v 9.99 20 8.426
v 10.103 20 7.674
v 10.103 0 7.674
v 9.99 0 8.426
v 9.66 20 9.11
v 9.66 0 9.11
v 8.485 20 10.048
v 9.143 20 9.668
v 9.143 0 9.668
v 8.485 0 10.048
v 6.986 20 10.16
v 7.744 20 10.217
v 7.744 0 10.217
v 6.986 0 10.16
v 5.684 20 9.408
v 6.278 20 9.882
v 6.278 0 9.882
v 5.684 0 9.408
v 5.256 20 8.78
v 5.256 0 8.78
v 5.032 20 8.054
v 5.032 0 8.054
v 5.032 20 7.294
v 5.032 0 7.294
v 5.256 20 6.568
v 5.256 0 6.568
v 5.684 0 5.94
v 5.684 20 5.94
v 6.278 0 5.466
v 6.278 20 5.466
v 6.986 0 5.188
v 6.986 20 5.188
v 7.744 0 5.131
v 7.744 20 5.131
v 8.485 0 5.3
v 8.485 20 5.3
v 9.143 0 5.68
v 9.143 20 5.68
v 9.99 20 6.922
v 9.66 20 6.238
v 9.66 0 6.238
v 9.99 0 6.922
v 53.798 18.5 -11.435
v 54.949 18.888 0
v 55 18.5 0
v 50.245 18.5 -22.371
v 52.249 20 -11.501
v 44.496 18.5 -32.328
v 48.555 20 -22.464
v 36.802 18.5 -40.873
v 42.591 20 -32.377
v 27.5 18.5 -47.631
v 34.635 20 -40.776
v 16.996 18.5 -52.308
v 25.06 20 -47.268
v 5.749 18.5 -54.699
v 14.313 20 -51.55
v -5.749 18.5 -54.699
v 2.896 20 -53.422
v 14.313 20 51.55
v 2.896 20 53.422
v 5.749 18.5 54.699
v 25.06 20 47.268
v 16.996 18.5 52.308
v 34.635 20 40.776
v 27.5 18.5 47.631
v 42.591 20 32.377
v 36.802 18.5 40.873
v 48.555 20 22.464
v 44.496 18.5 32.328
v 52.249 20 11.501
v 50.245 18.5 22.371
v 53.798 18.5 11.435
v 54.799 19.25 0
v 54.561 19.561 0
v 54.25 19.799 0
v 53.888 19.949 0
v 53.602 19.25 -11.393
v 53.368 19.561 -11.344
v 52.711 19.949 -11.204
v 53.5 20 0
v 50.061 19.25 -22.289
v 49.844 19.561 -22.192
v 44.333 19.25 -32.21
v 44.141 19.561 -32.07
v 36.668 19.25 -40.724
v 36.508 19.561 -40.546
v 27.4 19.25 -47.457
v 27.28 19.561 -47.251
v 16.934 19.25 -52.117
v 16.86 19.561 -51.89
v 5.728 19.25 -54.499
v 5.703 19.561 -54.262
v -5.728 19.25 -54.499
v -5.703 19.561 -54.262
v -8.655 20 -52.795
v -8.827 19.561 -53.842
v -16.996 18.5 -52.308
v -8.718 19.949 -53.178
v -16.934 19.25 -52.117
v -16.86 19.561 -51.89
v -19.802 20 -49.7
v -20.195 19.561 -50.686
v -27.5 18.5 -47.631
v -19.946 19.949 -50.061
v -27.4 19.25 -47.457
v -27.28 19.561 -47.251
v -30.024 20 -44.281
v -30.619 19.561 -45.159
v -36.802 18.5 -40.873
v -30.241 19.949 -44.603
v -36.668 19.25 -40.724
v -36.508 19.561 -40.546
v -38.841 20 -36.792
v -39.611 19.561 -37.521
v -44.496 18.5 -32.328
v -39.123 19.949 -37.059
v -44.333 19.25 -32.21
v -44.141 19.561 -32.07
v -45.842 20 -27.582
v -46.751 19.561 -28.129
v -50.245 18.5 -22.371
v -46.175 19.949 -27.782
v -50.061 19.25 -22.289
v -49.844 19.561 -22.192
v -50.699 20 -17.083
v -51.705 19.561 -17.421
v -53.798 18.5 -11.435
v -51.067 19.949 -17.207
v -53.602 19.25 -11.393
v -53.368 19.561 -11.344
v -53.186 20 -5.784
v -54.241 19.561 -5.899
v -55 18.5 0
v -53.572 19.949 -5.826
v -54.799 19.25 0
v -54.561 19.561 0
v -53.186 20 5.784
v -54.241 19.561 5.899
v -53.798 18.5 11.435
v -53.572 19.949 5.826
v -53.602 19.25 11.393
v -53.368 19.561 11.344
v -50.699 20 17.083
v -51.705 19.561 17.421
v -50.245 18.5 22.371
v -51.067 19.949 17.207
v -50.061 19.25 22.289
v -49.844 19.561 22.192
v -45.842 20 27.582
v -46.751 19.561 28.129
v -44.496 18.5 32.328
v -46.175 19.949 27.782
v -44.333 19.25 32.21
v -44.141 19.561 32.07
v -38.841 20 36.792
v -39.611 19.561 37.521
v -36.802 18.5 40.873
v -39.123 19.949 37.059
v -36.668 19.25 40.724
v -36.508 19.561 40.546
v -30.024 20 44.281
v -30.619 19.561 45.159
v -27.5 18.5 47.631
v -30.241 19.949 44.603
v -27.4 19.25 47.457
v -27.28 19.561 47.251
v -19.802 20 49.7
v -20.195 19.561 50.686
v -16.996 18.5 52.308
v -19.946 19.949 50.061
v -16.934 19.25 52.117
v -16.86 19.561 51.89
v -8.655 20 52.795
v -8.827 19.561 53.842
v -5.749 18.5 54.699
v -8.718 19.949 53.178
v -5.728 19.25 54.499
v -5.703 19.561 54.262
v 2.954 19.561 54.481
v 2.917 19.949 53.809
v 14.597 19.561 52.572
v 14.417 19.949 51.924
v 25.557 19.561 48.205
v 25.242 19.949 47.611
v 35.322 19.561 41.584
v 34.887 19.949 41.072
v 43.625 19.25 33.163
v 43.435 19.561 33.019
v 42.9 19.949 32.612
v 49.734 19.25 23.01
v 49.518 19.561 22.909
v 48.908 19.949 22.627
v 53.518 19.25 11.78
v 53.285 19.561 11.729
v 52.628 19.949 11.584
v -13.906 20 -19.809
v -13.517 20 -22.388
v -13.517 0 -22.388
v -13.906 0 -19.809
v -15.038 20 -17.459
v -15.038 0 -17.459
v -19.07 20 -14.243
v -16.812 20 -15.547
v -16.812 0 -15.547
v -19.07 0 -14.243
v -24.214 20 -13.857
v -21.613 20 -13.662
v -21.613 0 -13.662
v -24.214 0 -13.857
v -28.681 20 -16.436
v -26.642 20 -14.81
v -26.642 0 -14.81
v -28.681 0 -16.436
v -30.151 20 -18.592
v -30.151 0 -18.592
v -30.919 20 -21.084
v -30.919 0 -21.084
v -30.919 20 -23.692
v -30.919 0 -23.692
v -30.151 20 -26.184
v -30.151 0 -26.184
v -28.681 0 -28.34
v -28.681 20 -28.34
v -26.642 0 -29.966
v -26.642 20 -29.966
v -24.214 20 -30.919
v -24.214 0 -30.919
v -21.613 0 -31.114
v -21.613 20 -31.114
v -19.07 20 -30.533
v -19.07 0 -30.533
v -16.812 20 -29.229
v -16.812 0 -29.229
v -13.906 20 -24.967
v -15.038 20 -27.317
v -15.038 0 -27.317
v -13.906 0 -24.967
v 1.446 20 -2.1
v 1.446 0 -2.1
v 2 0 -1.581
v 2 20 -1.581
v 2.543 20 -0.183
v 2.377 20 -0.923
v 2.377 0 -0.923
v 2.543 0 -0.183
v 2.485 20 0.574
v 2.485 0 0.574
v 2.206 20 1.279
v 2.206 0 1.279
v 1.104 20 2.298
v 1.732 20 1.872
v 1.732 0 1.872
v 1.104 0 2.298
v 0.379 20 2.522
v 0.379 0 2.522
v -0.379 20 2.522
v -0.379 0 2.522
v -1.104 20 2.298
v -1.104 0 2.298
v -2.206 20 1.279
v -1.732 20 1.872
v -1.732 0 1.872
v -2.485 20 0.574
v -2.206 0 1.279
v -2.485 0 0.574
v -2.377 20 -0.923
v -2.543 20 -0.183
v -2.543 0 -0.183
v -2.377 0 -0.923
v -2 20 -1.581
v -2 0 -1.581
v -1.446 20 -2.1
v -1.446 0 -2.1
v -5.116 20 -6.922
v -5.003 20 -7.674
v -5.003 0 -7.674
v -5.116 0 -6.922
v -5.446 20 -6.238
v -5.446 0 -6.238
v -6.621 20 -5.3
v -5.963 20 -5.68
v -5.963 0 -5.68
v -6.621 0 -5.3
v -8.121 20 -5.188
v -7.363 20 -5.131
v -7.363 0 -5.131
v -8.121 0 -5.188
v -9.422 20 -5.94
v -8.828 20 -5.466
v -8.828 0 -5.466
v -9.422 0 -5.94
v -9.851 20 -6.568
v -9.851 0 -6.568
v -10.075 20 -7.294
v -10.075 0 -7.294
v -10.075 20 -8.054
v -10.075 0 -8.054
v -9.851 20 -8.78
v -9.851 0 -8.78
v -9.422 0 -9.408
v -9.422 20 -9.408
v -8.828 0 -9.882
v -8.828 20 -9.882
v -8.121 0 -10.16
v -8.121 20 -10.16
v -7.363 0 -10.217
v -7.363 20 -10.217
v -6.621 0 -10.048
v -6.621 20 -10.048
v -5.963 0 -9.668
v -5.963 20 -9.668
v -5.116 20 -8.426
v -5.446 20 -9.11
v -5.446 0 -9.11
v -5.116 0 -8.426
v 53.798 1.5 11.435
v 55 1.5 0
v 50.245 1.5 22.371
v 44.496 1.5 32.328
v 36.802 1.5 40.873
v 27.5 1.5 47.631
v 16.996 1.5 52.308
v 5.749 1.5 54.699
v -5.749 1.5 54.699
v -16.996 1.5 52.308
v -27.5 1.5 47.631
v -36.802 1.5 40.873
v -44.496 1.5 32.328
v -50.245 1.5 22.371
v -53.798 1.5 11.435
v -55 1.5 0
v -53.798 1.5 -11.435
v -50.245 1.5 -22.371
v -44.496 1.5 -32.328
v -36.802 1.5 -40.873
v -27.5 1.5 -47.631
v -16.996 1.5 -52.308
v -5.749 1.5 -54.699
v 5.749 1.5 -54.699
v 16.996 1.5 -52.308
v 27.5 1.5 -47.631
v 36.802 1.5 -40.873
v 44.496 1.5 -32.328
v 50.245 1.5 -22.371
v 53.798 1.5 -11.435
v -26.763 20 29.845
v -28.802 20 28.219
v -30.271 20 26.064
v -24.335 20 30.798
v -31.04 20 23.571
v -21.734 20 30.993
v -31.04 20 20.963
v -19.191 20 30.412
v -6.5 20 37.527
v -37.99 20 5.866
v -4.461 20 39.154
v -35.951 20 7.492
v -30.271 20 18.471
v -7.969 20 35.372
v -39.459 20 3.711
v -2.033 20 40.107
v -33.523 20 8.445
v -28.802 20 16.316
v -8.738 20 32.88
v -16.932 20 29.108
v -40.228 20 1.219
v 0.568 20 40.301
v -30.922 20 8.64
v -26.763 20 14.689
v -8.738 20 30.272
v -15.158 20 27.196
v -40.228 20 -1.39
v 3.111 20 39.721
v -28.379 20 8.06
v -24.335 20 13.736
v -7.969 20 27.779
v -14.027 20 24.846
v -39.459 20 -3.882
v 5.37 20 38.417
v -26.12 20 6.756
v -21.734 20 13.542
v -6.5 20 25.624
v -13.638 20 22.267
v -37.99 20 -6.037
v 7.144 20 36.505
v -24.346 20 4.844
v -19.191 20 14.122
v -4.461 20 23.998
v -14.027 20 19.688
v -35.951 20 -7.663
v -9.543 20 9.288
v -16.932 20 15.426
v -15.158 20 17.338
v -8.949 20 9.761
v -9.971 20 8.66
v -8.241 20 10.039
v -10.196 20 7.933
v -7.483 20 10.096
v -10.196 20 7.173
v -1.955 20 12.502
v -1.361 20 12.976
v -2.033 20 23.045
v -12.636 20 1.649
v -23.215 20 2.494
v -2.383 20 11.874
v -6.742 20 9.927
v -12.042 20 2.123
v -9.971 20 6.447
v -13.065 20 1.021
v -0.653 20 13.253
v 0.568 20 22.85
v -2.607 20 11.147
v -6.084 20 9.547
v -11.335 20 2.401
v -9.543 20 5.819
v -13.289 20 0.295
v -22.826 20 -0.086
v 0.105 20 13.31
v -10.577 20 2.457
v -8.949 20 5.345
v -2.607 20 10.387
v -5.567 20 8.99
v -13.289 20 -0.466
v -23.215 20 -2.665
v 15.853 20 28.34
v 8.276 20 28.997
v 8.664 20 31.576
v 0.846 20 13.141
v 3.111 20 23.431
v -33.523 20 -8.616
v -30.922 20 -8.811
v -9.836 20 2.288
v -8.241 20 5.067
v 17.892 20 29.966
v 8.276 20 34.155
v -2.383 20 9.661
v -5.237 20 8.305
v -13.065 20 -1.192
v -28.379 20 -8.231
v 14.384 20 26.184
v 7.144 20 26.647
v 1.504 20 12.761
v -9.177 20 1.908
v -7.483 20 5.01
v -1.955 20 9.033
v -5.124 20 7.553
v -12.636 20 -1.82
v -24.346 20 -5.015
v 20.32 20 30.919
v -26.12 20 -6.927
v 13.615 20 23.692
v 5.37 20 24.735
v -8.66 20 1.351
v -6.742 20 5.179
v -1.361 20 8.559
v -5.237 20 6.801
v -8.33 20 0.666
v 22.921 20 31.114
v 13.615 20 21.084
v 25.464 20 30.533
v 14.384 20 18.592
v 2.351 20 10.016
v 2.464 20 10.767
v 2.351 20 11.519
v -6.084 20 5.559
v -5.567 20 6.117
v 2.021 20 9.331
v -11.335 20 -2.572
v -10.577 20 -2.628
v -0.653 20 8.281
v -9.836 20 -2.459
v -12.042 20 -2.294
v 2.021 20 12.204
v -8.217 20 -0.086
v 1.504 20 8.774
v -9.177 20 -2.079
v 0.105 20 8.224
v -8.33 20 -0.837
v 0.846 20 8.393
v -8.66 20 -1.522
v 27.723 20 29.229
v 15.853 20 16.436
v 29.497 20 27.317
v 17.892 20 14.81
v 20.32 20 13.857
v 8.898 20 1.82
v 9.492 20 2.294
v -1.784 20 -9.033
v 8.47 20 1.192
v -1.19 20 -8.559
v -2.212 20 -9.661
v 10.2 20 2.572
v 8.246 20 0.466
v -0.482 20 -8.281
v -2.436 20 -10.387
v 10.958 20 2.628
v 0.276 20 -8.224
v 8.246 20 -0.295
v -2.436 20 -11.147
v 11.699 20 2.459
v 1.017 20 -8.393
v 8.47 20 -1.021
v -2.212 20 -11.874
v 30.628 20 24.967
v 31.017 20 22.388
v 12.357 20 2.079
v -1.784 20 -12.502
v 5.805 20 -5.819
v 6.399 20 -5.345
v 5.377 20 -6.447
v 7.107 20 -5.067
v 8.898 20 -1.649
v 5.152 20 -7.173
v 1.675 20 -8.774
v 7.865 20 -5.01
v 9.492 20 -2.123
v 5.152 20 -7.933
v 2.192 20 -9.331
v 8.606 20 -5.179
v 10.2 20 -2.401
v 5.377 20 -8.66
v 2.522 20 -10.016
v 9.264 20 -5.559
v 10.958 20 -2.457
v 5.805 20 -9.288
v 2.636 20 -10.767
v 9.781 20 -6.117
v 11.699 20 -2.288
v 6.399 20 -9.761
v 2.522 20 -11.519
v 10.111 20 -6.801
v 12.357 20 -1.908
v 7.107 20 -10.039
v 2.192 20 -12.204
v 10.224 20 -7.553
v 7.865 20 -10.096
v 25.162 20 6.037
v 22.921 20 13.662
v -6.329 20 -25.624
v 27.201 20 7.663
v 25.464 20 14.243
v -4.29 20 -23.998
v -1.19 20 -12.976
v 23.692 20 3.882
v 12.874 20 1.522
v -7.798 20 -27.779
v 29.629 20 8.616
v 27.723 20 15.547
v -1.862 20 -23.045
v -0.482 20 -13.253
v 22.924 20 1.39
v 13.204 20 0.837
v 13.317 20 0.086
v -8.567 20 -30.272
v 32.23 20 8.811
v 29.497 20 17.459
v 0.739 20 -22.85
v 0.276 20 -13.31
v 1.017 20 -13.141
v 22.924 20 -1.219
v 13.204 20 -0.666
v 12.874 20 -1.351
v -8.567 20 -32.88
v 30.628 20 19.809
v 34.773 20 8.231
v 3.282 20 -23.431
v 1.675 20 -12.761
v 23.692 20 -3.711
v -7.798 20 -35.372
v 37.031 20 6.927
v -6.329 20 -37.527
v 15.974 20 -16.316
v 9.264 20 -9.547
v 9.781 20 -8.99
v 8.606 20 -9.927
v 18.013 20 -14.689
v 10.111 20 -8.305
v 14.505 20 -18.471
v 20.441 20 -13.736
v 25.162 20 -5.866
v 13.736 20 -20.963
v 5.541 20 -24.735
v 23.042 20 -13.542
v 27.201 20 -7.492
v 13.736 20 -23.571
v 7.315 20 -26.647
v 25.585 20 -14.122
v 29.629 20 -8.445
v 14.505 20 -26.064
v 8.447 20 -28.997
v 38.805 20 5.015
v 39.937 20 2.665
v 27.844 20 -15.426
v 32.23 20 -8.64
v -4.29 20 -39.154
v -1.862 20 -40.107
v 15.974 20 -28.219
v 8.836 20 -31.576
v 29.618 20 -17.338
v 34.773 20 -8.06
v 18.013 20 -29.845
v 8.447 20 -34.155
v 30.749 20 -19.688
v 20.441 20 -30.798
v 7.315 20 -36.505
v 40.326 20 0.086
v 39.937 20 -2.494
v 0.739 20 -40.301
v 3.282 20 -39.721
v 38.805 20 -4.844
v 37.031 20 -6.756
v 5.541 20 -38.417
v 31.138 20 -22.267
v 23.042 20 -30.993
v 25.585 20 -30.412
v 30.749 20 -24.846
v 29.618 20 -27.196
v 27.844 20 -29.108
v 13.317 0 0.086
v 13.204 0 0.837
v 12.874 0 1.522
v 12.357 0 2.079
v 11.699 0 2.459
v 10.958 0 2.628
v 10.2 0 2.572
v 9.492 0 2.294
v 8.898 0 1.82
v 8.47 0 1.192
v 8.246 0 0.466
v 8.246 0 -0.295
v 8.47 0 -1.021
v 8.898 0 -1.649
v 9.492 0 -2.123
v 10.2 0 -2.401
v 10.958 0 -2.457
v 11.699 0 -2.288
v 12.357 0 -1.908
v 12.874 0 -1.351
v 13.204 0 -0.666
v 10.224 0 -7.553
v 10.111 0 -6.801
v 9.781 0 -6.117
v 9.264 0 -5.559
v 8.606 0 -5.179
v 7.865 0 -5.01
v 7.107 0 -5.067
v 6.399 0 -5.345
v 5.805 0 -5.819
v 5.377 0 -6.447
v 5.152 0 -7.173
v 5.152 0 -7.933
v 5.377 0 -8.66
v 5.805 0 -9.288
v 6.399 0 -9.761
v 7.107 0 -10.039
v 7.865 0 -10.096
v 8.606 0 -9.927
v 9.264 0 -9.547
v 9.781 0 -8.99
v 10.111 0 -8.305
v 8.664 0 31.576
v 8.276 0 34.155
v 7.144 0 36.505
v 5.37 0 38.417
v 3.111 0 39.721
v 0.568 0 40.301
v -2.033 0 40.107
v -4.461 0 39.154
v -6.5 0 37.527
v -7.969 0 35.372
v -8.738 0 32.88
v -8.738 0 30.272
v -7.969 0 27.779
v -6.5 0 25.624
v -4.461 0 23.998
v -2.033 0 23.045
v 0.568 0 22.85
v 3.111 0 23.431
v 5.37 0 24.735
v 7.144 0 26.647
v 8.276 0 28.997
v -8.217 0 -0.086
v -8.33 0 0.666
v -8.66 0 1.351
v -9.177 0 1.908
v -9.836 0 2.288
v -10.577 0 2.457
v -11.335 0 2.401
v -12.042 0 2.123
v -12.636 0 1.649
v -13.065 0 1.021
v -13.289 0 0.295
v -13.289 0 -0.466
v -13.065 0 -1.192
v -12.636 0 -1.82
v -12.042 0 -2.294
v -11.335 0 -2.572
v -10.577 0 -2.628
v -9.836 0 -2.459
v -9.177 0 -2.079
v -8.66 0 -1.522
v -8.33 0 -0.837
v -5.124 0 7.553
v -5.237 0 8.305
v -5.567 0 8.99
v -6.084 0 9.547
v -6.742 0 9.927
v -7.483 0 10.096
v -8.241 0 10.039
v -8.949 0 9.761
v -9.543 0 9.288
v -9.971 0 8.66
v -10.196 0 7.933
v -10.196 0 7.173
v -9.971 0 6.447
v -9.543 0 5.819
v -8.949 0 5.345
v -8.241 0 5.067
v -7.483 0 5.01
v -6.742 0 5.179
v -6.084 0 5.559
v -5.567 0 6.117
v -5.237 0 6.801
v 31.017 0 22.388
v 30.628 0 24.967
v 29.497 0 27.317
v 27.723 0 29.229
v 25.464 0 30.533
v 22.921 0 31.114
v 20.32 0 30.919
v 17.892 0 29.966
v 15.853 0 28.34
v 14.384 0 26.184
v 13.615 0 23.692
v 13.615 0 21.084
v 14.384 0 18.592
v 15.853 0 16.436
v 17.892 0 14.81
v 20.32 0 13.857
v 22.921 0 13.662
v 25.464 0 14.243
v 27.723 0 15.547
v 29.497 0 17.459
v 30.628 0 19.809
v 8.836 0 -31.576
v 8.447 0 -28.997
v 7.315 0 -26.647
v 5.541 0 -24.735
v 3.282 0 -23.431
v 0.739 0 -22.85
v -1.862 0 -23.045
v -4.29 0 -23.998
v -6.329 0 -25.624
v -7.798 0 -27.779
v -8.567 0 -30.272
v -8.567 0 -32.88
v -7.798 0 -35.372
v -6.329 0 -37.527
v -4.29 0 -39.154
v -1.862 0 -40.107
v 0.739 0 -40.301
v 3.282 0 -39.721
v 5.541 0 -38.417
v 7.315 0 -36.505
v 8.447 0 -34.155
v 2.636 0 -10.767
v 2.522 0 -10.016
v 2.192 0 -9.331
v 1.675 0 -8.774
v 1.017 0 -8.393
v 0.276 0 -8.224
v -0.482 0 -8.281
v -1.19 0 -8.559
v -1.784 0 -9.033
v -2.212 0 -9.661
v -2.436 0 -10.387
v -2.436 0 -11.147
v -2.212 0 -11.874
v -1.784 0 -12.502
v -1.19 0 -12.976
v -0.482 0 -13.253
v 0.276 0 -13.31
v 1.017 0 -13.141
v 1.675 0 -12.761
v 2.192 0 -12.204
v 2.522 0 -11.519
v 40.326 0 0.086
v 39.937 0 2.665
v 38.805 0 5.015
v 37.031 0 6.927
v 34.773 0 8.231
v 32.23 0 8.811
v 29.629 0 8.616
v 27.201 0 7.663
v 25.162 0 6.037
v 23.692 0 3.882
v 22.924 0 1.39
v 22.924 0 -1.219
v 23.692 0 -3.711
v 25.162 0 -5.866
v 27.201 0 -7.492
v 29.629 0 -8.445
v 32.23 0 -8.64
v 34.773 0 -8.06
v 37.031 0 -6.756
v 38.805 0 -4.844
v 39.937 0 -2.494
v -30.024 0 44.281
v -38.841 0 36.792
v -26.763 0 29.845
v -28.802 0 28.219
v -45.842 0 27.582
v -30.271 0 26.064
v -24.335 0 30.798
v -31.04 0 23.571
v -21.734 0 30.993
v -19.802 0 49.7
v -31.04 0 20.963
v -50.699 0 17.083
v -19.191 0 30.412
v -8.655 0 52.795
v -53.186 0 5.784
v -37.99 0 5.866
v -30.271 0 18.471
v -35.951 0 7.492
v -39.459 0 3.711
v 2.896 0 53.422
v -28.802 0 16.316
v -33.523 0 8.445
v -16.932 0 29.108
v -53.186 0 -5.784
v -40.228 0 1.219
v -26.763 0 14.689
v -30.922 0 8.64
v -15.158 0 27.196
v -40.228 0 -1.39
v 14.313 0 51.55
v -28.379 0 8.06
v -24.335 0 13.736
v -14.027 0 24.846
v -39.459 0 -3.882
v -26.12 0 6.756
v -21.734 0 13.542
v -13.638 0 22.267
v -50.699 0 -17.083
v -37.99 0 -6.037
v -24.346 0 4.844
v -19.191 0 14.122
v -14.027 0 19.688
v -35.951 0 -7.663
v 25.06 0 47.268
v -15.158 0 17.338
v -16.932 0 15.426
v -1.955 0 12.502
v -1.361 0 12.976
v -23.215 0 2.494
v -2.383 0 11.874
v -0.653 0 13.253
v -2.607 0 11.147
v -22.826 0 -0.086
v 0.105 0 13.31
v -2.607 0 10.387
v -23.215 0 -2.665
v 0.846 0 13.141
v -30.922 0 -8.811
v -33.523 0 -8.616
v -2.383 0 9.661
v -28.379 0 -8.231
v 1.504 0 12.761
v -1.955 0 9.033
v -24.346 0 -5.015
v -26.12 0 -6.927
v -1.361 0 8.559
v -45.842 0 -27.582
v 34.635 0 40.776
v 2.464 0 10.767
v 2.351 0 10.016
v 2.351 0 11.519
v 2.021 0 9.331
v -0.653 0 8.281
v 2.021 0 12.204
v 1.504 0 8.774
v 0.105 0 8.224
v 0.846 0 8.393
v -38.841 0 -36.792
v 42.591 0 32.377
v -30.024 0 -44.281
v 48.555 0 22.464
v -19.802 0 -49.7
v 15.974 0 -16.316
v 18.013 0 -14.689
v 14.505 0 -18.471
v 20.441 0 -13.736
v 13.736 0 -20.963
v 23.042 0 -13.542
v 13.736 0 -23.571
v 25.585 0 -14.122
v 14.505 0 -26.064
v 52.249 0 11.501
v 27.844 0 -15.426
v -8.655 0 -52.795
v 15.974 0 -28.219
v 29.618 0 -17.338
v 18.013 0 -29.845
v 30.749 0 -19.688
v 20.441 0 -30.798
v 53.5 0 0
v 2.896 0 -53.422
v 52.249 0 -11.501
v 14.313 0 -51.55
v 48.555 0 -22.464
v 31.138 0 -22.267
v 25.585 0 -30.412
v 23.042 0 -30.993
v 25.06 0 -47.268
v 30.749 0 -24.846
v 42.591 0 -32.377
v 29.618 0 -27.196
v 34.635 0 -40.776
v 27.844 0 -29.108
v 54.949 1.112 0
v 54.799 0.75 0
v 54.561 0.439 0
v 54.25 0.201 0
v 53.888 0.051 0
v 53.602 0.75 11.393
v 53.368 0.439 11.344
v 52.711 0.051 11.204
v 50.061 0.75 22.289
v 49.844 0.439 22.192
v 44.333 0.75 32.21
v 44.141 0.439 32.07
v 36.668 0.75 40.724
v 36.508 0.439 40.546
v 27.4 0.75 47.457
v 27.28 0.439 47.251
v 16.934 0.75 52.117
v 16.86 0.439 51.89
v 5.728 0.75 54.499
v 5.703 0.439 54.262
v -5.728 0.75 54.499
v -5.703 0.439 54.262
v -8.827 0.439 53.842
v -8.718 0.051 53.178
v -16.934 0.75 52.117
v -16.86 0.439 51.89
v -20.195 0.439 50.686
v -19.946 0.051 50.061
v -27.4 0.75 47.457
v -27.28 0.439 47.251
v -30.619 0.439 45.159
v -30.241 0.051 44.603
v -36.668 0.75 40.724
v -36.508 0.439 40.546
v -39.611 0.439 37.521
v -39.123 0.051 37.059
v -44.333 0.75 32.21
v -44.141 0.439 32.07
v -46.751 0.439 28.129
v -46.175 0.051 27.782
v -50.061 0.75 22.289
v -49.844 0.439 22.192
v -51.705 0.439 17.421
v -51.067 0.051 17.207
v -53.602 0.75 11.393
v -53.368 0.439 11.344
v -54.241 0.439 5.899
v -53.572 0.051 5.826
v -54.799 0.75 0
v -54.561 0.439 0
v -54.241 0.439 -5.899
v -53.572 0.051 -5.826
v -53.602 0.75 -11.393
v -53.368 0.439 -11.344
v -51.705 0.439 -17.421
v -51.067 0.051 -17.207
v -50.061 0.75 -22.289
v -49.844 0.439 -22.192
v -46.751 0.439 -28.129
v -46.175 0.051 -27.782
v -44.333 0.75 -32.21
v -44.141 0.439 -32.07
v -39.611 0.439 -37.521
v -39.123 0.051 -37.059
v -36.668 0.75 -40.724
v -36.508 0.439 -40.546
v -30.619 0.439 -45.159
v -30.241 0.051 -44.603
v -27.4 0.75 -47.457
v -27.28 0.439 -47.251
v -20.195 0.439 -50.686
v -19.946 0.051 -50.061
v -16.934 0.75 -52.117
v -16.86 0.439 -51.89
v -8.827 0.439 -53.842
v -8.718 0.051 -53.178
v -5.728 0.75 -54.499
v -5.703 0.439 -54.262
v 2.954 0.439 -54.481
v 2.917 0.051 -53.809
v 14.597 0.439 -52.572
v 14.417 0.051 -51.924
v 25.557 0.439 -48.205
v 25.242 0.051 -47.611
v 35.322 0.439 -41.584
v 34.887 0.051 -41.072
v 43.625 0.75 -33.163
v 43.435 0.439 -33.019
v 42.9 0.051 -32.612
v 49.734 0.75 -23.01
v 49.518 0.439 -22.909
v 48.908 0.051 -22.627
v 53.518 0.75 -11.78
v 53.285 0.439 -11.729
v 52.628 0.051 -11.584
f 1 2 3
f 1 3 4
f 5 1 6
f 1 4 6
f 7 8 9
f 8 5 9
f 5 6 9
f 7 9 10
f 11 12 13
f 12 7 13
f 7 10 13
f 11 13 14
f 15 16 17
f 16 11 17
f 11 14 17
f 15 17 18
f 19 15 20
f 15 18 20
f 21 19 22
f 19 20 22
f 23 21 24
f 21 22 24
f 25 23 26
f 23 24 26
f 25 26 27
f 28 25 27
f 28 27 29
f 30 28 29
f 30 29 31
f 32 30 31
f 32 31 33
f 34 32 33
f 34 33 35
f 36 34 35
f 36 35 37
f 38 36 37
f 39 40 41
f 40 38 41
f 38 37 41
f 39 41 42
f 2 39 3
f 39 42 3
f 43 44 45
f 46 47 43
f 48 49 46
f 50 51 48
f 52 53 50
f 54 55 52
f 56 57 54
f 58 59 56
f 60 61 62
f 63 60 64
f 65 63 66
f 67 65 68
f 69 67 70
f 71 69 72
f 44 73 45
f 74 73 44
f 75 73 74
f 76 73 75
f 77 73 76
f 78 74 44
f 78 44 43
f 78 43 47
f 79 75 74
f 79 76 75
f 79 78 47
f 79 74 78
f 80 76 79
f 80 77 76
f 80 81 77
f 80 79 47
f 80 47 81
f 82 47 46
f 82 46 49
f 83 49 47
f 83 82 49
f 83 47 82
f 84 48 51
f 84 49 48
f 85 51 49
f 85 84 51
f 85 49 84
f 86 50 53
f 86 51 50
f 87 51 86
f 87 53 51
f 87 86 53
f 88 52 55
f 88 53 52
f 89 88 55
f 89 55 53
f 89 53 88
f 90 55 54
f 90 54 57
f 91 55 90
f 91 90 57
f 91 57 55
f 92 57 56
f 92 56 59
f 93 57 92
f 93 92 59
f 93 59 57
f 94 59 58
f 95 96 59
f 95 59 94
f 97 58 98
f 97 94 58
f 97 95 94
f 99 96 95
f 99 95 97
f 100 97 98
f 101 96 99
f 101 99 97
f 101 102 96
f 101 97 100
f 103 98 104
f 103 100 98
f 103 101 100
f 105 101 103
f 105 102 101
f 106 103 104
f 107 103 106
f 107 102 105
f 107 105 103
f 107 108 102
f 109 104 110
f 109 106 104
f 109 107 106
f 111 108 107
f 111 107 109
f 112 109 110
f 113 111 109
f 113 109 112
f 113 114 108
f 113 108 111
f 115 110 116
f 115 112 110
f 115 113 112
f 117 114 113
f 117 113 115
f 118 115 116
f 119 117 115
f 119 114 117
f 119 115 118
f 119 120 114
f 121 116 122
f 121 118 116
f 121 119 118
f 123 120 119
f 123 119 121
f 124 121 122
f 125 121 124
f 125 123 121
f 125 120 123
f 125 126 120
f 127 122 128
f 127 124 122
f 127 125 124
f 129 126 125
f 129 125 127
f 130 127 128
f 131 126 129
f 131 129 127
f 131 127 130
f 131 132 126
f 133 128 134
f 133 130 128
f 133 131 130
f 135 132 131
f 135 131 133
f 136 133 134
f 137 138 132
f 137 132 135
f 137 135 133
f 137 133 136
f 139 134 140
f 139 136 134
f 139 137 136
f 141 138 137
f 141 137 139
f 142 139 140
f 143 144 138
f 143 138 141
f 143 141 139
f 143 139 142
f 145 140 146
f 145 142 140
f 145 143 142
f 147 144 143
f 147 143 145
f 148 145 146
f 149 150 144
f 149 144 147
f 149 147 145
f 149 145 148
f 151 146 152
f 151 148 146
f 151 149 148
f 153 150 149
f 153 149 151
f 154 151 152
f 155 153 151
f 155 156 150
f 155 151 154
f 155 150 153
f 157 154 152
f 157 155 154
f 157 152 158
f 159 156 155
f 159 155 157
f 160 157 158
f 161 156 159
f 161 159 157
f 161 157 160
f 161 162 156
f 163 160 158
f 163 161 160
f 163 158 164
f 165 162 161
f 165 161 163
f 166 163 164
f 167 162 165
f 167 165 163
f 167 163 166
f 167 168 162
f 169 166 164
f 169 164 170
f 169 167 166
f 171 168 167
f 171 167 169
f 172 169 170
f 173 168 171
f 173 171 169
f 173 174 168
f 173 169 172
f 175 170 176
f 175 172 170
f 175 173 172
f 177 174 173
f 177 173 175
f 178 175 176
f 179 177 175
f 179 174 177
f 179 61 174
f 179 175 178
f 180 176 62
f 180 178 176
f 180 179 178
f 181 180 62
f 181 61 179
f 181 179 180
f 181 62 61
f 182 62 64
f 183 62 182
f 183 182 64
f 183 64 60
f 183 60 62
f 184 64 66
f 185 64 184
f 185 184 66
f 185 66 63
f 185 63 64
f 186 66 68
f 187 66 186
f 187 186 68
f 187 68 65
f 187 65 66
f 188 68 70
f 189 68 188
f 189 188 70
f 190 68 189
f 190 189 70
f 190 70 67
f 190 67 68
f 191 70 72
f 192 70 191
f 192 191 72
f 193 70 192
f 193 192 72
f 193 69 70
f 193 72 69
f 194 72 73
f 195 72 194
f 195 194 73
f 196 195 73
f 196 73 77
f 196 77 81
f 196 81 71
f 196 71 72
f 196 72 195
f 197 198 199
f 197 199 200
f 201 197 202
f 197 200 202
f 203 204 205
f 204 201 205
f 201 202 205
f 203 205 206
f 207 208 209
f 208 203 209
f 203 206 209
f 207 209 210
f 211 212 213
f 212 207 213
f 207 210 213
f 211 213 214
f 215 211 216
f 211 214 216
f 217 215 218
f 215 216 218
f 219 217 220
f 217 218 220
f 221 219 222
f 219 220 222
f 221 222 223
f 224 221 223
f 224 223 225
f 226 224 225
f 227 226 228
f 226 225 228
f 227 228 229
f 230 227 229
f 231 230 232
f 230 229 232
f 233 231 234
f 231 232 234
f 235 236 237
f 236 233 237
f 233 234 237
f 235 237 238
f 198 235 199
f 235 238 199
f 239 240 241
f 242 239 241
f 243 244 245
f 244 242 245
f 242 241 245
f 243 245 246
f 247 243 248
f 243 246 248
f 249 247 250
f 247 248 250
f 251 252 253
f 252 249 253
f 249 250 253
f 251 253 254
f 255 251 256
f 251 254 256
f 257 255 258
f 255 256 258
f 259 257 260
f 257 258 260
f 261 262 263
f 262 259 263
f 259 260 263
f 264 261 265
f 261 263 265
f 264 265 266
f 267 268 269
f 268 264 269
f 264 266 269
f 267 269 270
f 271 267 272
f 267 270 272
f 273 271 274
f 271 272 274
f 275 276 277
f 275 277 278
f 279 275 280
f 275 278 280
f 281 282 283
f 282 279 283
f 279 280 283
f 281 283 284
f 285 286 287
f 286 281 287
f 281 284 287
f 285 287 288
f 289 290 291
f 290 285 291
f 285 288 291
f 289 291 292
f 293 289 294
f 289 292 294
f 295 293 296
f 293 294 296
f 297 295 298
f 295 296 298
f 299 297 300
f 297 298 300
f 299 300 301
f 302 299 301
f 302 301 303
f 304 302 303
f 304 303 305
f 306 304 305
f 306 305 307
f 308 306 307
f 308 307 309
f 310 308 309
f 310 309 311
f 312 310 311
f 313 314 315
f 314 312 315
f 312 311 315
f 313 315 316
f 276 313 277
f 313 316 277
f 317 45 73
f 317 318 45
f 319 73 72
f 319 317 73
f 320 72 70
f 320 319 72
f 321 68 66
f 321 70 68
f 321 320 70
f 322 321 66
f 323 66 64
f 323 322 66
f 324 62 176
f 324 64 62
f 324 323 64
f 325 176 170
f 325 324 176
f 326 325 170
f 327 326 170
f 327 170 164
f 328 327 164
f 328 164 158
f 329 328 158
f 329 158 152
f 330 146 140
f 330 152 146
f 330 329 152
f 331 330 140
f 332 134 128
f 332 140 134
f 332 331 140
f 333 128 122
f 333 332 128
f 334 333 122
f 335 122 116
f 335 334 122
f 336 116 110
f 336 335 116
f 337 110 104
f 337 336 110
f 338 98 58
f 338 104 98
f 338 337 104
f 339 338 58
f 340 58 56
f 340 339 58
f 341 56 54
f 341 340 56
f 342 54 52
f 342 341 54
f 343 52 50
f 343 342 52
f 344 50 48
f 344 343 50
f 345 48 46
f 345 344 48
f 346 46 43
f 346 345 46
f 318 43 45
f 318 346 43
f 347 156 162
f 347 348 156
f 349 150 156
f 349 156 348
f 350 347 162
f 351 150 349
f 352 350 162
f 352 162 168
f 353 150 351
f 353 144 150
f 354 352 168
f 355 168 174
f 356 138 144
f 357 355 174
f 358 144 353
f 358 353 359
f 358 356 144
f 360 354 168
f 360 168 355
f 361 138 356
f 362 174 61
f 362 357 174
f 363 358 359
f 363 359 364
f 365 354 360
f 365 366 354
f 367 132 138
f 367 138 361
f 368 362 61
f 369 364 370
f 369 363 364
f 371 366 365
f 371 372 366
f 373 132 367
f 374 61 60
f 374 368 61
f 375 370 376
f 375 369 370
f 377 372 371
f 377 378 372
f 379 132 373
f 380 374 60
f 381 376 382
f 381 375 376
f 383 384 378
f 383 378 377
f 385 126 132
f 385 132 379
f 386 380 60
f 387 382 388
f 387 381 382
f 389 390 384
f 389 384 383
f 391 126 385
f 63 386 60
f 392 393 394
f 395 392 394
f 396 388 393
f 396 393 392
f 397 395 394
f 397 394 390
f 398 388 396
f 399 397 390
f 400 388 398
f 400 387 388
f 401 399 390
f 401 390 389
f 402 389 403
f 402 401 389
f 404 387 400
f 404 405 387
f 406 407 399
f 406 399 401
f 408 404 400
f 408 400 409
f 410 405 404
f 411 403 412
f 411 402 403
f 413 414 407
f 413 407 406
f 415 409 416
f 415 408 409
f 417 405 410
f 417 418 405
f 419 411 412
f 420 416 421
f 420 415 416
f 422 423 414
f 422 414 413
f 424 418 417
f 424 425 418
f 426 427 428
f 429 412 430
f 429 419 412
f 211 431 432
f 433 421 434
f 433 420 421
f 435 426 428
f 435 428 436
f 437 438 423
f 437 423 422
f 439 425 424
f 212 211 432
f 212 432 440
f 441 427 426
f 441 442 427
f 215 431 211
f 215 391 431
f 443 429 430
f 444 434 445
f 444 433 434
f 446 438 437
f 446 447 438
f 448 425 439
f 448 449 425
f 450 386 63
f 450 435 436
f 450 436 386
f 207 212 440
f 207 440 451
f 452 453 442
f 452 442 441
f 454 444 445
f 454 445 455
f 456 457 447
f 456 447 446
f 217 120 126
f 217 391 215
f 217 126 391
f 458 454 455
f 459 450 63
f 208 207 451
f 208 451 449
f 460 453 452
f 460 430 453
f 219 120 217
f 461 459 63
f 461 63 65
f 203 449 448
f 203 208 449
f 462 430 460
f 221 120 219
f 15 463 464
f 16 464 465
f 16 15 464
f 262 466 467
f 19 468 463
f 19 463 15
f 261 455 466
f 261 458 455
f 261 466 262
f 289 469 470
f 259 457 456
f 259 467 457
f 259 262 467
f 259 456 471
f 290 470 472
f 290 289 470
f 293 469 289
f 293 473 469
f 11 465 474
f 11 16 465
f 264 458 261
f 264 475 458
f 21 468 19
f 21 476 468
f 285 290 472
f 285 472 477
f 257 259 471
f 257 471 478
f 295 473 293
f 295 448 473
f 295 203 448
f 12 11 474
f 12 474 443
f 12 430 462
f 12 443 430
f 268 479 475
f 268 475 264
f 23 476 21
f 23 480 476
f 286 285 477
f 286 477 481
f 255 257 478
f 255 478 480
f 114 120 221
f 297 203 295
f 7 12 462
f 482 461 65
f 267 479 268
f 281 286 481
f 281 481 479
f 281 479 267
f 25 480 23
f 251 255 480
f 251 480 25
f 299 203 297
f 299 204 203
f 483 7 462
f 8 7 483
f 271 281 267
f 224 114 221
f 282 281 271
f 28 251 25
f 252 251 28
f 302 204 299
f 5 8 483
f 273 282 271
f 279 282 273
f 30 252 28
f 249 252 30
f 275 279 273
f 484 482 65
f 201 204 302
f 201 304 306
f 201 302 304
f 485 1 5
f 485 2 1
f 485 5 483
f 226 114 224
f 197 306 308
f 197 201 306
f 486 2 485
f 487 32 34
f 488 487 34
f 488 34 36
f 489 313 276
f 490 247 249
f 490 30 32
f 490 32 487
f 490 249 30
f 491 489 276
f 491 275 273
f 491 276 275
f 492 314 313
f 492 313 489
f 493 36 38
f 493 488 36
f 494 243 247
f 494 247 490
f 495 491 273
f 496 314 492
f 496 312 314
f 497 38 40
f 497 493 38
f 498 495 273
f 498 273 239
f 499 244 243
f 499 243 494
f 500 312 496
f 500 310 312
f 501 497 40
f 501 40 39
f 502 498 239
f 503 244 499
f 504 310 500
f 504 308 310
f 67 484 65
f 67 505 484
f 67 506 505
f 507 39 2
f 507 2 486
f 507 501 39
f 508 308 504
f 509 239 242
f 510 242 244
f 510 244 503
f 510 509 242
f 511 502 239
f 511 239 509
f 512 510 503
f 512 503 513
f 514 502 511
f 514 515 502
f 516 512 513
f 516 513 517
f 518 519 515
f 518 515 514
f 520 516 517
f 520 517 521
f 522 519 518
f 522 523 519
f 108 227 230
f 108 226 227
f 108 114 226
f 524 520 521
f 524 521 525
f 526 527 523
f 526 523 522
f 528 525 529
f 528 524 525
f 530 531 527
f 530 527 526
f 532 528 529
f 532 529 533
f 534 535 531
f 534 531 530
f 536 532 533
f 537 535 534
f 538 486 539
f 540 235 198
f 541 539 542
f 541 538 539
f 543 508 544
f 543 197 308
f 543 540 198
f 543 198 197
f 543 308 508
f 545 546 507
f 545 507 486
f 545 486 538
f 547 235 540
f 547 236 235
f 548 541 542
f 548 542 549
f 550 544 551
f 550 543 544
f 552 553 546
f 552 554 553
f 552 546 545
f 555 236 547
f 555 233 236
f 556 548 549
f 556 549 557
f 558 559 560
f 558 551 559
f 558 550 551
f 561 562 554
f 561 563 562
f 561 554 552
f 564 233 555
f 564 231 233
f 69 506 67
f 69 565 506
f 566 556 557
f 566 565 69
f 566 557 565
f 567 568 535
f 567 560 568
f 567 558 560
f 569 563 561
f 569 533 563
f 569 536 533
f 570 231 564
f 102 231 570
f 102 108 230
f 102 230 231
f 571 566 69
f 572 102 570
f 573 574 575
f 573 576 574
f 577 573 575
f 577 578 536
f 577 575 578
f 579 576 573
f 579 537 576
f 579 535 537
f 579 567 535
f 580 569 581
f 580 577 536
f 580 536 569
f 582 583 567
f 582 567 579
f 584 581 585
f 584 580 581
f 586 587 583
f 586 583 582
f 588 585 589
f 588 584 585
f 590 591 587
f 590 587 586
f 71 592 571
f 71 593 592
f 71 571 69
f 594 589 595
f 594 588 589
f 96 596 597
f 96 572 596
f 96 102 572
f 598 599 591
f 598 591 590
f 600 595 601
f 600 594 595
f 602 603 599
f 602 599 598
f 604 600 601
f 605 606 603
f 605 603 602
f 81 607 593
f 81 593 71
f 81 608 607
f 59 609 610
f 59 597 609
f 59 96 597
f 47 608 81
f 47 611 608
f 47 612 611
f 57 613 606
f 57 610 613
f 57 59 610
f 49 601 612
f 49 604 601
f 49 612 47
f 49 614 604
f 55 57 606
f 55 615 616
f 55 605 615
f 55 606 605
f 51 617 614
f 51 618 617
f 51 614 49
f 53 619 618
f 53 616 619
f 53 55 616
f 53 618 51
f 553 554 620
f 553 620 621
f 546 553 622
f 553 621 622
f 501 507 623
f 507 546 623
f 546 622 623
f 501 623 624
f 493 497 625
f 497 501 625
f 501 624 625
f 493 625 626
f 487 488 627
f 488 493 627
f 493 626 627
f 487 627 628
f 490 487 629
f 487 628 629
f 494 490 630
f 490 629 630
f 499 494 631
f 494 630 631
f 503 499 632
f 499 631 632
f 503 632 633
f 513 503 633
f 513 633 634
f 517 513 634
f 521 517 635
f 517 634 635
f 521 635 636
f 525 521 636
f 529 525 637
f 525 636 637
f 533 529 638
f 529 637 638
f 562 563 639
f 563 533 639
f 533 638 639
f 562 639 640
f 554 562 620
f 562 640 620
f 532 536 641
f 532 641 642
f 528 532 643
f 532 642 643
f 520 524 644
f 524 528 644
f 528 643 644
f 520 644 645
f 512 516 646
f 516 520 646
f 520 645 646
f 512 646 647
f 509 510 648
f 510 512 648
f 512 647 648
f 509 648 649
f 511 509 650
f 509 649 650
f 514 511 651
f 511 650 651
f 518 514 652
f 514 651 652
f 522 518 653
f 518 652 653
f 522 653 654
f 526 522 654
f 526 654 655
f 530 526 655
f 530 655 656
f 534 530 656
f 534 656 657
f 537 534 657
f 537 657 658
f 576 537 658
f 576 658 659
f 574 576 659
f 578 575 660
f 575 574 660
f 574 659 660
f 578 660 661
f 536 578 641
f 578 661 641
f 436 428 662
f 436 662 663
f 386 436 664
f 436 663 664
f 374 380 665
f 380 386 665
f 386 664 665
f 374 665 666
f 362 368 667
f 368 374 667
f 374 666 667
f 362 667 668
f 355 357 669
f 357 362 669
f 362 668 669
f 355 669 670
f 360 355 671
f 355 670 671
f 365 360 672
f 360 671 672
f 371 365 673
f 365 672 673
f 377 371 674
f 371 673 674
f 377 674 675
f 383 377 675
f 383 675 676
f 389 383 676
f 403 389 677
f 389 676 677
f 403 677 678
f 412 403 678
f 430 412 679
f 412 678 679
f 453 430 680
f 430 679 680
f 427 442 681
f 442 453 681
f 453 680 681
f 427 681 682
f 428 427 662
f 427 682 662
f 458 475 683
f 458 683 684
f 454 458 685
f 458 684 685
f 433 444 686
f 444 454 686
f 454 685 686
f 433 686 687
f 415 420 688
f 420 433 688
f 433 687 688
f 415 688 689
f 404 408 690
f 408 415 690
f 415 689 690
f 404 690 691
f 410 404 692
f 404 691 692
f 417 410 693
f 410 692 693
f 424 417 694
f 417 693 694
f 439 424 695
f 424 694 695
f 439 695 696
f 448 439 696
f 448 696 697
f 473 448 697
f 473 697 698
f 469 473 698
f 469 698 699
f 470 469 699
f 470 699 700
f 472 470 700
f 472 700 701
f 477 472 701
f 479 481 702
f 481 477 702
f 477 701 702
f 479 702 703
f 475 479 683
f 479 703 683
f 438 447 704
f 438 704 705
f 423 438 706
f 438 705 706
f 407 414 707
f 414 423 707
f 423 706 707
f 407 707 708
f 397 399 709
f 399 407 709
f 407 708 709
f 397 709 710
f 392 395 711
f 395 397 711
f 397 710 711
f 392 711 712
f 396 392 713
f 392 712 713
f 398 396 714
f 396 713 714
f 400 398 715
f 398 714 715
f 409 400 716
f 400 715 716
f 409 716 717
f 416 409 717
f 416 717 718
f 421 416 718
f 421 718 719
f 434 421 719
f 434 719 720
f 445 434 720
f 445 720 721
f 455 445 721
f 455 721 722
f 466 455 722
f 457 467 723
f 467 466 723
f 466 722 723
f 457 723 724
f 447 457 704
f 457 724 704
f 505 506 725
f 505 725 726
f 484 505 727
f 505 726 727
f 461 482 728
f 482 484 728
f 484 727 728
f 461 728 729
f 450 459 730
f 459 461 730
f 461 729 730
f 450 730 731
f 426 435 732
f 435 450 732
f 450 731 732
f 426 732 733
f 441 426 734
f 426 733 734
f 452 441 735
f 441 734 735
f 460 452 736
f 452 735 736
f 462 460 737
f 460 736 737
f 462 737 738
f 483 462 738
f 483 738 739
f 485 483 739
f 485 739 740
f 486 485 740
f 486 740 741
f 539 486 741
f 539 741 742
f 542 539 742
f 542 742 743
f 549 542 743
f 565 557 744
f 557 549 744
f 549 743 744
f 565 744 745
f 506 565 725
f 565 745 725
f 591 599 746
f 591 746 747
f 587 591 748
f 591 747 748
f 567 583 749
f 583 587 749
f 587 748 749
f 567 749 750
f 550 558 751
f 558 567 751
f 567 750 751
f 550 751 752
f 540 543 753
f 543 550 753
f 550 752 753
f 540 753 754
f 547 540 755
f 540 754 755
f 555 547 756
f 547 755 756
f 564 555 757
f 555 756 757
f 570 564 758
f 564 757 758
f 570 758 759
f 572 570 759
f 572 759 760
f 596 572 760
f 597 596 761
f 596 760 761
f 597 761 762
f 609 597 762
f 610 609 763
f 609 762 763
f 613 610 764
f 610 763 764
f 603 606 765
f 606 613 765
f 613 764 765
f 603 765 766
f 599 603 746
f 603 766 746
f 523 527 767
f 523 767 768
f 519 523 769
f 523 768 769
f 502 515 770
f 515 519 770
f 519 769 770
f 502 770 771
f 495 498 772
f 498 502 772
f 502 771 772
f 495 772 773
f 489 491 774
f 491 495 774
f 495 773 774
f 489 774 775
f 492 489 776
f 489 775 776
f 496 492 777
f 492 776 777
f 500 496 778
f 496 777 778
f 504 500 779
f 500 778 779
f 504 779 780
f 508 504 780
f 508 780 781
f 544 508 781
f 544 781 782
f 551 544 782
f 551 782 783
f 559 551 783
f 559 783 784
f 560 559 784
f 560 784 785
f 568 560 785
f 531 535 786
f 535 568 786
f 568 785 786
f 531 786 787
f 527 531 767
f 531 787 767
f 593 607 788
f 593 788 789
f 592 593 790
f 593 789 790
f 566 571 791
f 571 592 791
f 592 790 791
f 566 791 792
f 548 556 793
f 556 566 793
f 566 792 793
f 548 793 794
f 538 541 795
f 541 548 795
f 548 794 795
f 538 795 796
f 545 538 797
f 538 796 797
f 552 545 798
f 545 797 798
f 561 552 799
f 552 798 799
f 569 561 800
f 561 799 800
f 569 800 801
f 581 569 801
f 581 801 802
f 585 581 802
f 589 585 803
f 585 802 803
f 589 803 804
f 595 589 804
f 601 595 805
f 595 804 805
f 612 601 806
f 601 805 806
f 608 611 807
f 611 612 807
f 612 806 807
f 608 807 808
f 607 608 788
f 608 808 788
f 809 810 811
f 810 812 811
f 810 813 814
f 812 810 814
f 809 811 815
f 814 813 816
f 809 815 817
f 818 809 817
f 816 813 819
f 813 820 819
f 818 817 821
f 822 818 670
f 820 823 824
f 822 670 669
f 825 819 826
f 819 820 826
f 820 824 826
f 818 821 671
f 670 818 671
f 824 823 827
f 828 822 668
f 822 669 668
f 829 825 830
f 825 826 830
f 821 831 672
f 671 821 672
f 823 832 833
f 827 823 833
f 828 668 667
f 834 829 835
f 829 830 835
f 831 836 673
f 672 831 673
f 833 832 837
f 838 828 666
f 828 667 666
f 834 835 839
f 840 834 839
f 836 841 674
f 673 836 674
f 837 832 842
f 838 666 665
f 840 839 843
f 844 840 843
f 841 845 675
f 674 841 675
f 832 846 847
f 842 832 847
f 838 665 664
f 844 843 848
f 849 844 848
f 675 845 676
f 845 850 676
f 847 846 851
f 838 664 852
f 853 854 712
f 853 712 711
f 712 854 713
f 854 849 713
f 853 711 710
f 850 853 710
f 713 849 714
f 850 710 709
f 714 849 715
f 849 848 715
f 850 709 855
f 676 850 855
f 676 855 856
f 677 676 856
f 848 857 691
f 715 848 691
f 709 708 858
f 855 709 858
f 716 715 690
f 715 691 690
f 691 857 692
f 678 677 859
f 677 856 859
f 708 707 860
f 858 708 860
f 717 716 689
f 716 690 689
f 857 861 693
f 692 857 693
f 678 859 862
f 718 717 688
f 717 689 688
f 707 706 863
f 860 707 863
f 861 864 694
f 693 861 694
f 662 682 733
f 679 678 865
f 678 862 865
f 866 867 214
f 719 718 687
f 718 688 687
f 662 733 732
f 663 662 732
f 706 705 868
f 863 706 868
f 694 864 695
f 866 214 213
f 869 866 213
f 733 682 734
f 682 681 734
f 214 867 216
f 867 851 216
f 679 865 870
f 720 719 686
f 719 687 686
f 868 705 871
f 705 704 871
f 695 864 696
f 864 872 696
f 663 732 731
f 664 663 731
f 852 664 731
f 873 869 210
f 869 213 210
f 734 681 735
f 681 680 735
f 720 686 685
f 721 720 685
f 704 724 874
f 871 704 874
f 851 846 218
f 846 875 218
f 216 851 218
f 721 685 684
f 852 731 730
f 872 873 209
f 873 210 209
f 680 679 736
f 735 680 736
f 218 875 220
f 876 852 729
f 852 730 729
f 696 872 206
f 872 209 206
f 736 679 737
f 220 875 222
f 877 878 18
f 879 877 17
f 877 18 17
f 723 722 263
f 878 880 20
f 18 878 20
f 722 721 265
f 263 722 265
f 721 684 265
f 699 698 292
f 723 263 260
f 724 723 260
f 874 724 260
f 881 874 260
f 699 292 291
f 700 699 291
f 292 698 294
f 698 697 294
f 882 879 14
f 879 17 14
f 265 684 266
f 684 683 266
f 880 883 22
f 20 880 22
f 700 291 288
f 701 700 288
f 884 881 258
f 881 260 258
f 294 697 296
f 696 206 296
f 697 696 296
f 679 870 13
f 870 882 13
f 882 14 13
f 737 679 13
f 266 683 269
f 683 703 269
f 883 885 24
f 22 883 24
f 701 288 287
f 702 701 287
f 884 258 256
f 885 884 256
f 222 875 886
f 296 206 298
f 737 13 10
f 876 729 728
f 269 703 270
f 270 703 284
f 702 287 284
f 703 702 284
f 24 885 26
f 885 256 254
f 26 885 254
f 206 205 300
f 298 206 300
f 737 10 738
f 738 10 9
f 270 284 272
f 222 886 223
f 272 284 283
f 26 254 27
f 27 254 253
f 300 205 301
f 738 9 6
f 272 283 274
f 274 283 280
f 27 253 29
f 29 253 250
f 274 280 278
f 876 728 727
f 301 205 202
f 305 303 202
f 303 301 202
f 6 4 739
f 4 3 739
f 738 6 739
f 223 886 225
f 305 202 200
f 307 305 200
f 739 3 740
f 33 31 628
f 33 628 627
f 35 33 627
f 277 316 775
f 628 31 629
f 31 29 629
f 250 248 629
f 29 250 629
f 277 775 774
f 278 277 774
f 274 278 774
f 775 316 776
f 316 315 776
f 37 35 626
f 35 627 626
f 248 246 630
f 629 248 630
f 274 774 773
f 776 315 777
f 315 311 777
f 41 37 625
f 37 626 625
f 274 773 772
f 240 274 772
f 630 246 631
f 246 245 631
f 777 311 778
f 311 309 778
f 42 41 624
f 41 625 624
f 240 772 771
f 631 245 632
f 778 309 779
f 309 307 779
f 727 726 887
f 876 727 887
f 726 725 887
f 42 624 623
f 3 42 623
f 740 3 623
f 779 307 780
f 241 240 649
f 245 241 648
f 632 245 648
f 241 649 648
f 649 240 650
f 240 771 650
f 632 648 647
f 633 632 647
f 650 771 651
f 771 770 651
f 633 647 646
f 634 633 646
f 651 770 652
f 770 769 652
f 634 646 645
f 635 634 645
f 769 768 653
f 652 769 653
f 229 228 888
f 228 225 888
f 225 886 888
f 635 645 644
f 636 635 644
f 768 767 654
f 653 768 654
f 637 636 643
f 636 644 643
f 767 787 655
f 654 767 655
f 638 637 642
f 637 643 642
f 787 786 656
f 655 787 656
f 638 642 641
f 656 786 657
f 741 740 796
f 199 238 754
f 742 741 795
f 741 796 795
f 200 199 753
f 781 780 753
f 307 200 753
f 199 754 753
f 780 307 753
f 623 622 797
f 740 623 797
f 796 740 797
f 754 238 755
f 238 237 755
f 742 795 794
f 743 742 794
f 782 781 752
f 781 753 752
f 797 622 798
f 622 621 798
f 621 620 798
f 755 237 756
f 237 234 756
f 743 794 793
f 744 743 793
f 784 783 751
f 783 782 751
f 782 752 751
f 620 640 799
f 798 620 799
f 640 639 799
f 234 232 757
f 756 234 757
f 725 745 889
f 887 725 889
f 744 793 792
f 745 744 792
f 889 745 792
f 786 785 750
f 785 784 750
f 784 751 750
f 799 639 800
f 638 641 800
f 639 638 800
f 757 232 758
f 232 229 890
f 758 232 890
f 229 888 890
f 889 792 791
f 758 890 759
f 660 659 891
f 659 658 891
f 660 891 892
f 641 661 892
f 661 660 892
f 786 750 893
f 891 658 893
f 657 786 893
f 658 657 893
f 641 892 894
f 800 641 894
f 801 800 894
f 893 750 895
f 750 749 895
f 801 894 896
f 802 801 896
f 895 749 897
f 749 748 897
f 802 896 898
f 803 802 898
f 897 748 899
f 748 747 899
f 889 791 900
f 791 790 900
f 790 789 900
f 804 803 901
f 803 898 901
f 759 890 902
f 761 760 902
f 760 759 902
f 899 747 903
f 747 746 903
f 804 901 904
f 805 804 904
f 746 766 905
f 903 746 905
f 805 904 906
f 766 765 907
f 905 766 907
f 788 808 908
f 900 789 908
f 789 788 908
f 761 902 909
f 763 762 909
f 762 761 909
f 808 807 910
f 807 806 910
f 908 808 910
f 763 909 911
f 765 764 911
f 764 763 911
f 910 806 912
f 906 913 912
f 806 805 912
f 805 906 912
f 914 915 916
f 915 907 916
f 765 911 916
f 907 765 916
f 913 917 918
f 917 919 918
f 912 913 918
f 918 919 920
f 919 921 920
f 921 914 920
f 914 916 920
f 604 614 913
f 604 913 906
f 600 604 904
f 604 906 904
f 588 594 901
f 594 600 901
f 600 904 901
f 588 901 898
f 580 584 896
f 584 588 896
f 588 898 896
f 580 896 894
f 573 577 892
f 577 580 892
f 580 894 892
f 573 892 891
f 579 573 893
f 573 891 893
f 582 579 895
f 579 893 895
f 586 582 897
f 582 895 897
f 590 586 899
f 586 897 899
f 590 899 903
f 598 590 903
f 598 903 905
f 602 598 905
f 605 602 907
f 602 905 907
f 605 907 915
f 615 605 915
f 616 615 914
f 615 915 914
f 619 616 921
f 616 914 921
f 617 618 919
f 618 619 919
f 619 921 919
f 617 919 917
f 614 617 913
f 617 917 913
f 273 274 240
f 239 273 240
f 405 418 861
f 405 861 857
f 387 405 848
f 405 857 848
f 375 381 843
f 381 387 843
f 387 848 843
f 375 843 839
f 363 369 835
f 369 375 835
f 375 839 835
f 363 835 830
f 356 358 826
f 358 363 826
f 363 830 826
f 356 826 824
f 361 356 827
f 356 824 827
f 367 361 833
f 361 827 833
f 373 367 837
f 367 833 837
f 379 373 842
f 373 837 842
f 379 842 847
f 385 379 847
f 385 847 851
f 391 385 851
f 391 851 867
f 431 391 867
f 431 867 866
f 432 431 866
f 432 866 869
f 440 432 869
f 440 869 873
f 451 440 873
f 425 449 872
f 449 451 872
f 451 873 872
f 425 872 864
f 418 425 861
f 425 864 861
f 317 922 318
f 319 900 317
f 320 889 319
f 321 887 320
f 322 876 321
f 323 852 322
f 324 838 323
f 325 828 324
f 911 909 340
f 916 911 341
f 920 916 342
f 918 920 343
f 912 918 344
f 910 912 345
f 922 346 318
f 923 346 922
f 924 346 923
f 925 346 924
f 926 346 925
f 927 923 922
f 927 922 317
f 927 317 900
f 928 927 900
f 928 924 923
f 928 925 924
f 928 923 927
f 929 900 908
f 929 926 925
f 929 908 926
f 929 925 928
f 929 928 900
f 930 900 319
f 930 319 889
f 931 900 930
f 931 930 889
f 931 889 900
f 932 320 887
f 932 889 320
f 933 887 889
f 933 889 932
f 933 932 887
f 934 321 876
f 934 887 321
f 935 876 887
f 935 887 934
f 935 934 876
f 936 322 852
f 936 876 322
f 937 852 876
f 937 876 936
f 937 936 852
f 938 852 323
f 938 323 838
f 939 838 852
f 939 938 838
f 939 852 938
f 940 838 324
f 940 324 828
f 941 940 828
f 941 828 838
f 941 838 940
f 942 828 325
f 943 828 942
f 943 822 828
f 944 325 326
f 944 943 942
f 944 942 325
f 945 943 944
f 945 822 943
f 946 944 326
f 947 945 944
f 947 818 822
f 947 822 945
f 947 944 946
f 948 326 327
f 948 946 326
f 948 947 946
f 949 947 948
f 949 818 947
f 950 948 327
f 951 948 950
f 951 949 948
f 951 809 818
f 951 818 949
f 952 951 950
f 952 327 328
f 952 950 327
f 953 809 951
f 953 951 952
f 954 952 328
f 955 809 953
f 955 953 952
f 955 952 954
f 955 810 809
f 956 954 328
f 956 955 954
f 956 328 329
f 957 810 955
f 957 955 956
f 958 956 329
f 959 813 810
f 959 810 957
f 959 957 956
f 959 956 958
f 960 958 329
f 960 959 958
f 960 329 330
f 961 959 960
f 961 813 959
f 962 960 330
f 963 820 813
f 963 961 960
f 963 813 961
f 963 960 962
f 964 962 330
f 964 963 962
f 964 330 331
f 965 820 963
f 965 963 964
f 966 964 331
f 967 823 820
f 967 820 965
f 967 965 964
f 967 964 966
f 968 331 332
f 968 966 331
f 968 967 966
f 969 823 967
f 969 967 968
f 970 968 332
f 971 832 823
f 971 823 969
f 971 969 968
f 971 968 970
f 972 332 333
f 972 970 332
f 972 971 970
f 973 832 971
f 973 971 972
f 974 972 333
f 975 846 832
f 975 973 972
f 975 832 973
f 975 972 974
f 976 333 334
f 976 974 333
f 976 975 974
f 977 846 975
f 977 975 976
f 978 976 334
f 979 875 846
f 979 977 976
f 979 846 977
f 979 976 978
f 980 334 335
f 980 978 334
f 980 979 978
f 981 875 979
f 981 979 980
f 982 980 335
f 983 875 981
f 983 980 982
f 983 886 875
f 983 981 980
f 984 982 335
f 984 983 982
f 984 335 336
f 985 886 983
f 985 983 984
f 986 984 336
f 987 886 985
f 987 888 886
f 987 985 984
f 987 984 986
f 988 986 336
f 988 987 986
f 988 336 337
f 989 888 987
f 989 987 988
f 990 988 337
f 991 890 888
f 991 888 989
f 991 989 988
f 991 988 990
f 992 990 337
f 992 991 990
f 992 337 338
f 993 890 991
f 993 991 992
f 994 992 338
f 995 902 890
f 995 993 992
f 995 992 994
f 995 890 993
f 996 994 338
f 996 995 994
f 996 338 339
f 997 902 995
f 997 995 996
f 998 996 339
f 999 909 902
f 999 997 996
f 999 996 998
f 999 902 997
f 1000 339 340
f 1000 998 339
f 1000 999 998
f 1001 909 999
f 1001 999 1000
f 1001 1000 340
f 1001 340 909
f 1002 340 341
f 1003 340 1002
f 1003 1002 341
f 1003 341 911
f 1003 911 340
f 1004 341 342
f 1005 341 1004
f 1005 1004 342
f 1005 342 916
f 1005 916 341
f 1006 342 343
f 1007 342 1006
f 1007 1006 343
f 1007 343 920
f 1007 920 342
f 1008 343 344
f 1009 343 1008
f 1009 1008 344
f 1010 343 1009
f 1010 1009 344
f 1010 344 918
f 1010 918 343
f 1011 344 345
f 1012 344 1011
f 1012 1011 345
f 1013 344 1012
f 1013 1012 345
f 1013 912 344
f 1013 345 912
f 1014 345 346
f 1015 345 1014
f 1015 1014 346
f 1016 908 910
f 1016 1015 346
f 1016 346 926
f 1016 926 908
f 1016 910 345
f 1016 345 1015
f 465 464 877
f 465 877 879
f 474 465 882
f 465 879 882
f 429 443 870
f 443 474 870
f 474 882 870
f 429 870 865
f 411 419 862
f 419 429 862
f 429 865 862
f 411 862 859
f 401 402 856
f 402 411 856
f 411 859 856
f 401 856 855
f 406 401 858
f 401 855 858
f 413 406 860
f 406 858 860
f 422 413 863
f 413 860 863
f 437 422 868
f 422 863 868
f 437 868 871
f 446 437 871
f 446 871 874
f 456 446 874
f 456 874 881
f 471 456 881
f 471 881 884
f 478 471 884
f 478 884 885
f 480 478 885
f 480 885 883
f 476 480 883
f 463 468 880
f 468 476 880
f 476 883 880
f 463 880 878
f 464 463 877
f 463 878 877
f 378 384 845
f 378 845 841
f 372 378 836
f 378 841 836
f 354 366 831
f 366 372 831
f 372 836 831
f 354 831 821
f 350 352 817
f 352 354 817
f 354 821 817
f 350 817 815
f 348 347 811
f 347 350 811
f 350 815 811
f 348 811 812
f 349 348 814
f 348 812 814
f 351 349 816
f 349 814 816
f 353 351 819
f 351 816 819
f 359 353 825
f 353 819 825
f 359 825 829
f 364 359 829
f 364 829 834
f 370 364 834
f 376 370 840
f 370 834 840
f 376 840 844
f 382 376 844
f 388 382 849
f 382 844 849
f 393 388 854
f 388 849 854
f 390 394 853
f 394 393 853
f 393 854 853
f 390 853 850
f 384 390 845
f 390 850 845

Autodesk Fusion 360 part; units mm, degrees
sketch "Sketch1" plane through (0, 0, 0) normal (0, 1, 0) x (1, 0, 0) in component "Wheel"
  circle A0 centre (0, 0) radius 55
  circle A1 centre (0.0855, 31.5759) radius 8.75
  circle A2 centre (-22.2671, 22.388) radius 8.75
  circle A3 centre (-31.5759, 0.0855) radius 8.75
  circle A4 centre (-22.388, -22.2671) radius 8.75
  circle A5 centre (-0.0855, -31.5759) radius 8.75
  circle A6 centre (22.2671, -22.388) radius 8.75
  circle A7 centre (31.5759, -0.0855) radius 8.75
  circle A8 centre (22.388, 22.2671) radius 8.75
  line L0 (-1.4465, 2.1) -> (1.4465, 2.1)
  arc A9 (-1.4465, 2.1) -> (1.4465, 2.1) centre (0, 0) ccw
  circle A10 centre (-0.0855, -10.7672) radius 2.55
  circle A11 centre (7.5531, -7.674) radius 2.55
  circle A12 centre (10.7672, -0.0855) radius 2.55
  circle A13 centre (7.674, 7.5531) radius 2.55
  circle A14 centre (0.0855, 10.7672) radius 2.55
  circle A15 centre (-7.5531, 7.674) radius 2.55
  circle A16 centre (-10.7672, 0.0855) radius 2.55
  circle A17 centre (-7.674, -7.5531) radius 2.55
  dimension "d1" = 110
  dimension "d5" = 5.1
  dimension "d6" = 17.5
  dimension "d8" = 360
  dimension "d9" = 2.1
  dimension "d12" = 5.1
  dimension "d14" = 360
extrude "Extrude2" add sketch "Sketch1" along normal blind 20 in component "Wheel"
fillet "Fillet1" radius 1.5 2 edges at (-51.278, 20, 19.8888) (-51.278, 0, 19.8888) in component "Wheel"
component "Wheel" placed x (1, 0, 0) y (0, 1, 0) z (0, 0, 1) at (0, 0, 0)
equation "d1 = ( 55 * 2 ) * 1 mm"
